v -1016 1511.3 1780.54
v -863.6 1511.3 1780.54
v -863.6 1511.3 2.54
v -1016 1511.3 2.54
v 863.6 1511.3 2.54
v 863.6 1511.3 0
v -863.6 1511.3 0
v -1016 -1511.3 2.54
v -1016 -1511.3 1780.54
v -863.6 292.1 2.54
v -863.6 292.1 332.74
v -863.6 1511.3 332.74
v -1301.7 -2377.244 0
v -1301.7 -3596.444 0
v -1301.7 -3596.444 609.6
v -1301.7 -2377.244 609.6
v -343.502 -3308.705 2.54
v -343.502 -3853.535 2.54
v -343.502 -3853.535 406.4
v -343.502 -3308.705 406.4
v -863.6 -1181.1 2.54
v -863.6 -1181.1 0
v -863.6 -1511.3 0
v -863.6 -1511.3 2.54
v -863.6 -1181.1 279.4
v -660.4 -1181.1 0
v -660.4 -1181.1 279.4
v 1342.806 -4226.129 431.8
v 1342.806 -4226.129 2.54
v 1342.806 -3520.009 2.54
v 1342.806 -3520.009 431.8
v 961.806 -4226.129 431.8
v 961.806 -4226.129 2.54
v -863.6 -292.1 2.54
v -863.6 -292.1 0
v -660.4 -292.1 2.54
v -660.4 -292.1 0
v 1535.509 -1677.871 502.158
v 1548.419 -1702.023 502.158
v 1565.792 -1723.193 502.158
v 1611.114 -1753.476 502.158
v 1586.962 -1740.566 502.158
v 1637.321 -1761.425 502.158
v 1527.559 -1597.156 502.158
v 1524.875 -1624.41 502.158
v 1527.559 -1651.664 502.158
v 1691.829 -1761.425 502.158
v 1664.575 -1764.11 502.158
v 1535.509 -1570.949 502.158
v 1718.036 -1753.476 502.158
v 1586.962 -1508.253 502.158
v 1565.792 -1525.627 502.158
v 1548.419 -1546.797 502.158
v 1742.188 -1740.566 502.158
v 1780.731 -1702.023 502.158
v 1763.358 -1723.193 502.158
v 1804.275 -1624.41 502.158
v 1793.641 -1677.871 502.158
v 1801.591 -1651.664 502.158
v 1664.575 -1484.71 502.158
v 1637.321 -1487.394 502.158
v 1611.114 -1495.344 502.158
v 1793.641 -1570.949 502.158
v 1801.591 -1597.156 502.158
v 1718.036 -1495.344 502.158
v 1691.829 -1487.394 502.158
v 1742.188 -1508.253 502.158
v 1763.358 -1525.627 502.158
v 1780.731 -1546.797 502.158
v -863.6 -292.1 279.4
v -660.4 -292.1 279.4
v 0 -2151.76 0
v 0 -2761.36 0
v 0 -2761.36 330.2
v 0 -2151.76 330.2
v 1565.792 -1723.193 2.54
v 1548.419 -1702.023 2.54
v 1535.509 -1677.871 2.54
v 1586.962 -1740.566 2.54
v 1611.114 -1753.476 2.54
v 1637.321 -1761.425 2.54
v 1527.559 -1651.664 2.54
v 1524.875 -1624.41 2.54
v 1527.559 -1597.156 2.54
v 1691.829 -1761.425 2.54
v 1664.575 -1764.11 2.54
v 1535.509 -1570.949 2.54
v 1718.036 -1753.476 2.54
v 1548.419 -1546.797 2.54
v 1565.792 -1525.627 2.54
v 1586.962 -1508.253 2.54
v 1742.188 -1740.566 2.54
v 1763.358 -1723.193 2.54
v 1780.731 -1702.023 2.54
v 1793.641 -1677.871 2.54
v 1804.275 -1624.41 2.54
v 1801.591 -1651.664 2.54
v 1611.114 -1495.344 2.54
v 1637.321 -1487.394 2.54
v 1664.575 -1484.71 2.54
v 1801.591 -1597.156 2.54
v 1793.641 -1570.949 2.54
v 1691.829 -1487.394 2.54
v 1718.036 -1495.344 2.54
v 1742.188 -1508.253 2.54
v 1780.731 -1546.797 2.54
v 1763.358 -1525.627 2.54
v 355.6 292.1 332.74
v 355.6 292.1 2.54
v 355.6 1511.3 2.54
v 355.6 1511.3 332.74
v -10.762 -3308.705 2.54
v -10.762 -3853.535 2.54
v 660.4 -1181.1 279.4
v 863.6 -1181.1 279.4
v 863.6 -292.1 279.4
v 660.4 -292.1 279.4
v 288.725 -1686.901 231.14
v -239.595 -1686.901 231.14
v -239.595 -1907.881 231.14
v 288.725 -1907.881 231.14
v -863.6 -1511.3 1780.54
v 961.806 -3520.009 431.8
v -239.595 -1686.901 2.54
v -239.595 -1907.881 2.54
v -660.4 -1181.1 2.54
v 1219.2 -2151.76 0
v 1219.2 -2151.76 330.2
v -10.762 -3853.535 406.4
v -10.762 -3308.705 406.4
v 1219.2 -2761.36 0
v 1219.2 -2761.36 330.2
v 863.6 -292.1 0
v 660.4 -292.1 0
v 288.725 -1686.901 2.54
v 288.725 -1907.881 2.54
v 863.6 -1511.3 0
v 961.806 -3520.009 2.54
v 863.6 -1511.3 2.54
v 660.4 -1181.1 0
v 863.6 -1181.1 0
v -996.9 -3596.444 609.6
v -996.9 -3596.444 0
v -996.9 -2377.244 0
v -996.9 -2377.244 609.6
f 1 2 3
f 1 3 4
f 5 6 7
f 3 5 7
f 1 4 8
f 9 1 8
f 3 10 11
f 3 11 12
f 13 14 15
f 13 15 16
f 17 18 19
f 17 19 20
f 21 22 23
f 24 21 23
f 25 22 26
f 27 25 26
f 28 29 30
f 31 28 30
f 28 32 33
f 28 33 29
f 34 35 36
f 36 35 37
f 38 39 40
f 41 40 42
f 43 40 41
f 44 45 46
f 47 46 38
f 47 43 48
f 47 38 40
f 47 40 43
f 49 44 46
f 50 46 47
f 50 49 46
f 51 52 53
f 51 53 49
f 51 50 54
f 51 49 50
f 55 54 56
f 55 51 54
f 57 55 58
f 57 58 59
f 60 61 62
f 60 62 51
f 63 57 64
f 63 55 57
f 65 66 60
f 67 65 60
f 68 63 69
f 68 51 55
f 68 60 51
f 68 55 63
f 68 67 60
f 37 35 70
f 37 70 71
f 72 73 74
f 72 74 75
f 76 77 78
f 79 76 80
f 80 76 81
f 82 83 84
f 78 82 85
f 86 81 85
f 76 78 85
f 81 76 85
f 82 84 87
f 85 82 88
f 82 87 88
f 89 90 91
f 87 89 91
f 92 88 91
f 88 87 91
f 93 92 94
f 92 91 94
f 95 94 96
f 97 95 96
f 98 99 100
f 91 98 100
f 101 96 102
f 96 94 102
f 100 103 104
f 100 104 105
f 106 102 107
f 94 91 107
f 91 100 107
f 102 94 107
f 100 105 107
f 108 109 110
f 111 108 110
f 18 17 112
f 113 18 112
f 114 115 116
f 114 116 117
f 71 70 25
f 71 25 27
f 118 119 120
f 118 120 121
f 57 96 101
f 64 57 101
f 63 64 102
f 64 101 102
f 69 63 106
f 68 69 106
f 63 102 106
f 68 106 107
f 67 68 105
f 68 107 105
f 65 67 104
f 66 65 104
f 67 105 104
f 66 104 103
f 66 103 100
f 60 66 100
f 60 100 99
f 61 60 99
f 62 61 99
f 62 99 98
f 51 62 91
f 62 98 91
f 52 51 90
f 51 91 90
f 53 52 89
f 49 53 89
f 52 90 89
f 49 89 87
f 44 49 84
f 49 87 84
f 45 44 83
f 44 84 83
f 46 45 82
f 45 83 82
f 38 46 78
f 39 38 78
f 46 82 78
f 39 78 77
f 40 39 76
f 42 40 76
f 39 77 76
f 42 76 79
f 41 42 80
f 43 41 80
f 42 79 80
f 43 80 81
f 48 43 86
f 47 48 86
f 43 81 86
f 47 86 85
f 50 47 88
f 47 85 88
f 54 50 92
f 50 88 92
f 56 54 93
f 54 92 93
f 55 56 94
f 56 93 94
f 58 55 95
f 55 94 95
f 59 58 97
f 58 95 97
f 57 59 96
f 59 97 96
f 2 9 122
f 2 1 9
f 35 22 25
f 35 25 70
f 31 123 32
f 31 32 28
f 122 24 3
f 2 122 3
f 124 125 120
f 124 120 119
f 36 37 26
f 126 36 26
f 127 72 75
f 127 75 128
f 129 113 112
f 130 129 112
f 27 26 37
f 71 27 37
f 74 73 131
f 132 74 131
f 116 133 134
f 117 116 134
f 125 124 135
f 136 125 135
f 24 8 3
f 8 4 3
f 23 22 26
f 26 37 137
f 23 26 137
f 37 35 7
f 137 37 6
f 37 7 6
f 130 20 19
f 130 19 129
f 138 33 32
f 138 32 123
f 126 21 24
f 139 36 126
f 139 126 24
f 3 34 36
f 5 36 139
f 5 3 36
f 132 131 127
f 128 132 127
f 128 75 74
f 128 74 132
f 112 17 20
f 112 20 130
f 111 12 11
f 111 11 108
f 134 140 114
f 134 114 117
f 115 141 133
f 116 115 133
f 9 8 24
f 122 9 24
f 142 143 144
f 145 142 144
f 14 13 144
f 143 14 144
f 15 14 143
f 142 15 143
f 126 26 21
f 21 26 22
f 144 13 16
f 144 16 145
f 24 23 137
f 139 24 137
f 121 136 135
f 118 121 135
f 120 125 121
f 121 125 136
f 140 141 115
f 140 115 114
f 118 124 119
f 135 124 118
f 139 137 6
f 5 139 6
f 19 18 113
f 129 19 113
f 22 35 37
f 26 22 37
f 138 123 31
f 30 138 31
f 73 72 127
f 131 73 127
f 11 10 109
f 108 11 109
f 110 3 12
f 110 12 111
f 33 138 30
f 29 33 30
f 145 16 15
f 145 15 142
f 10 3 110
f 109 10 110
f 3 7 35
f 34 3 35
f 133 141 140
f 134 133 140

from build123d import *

# Parameters (mm, degrees)
F0_W      = 203.2
F0_H      = 889
F1_DEPTH  = 279.4
F4_DEPTH  = 2.54
F6_DEPTH  = 1778
F7_W      = 1219.2
F7_H      = 1219.2
F8_DEPTH  = 330.2
F9_W      = 304.8
F9_H      = 1219.2
F10_DEPTH = 609.6
F11_W     = 528.32
F11_H     = 220.98
F12_DEPTH = 228.6
F13_W     = 1219.2
F13_H     = 609.6
F14_DEPTH = 330.2
F15_W     = 332.74
F15_H     = 544.83
F16_DEPTH = 403.86
F17_W     = 381
F17_H     = 706.12
F18_DEPTH = 429.26
F19_R     = 139.7
F20_DEPTH = 499.618


with BuildPart() as f1:
    # F0 (on Top) → F1 (new body)
    with BuildSketch(Plane.XY):
        with Locations((-762, -736.6)):
            Rectangle(F0_W, F0_H)
    extrude(amount=F1_DEPTH)


with BuildPart() as f2_1:
    # F2: instance of F1
    add(f1.part.mirror(Plane.YZ))


with BuildPart() as f4:
    # F3 (on face) → F4 (new body)
    with BuildSketch(Plane.XY):
        Polygon((-863.6, -1181.1), (-863.6, -1511.3), (863.6, -1511.3), (863.6, 1511.3), (-863.6, 1511.3), (-863.6, 419.1), (-863.6, -292.1), (-660.4, -292.1), (-660.4, -1181.1), align=None)
    extrude(amount=F4_DEPTH)


with BuildPart() as f6:
    # F5 (on face) → F6 (new body)
    with BuildSketch(Plane.XY.offset(2.54)):
        Polygon((-1016, -1511.3), (-863.6, -1511.3), (-863.6, -1181.1), (-863.6, -292.1), (-863.6, 1511.3), (-1016, 1511.3), align=None)
    extrude(amount=F6_DEPTH)


with BuildPart() as f8:
    # F7 (on face) → F8 (new body)
    with BuildSketch(Plane.XY.offset(2.54)):
        with Locations((-254, 901.7)):
            Rectangle(F7_W, F7_H)
    extrude(amount=F8_DEPTH)


with BuildPart() as f10:
    # F9 (on face) → F10 (new body)
    with BuildSketch(Plane.XY):
        with Locations((-1149.300161, -2986.844182)):
            Rectangle(F9_W, F9_H)
    extrude(amount=F10_DEPTH)


with BuildPart() as f12:
    # F11 (on face) → F12 (new body)
    with BuildSketch(Plane.XY.offset(2.54)):
        with Locations((24.565428, -1797.391298)):
            Rectangle(F11_W, F11_H)
    extrude(amount=F12_DEPTH)


with BuildPart() as f14:
    # F13 (on face) → F14 (new body)
    with BuildSketch(Plane.XY):
        with Locations((609.6, -2456.55981)):
            Rectangle(F13_W, F13_H)
    extrude(amount=F14_DEPTH)


with BuildPart() as f16:
    # F15 (on face) → F16 (new body)
    with BuildSketch(Plane.XY.offset(2.54)):
        with Locations((-177.13221, -3581.119776)):
            Rectangle(F15_W, F15_H)
    extrude(amount=F16_DEPTH)


with BuildPart() as f18:
    # F17 (on face) → F18 (new body)
    with BuildSketch(Plane.XY.offset(2.54)):
        with Locations((1152.306117, -3873.069286)):
            Rectangle(F17_W, F17_H)
    extrude(amount=F18_DEPTH)


with BuildPart() as f20:
    # F19 (on face) → F20 (new body)
    with BuildSketch(Plane.XY.offset(2.54)):
        with Locations((1664.5751, -1624.409795)):
            Circle(F19_R)
    extrude(amount=F20_DEPTH)


solid = Compound([f1.part, f2_1.part, f4.part, f6.part, f8.part, f10.part, f12.part, f14.part, f16.part, f18.part, f20.part])
